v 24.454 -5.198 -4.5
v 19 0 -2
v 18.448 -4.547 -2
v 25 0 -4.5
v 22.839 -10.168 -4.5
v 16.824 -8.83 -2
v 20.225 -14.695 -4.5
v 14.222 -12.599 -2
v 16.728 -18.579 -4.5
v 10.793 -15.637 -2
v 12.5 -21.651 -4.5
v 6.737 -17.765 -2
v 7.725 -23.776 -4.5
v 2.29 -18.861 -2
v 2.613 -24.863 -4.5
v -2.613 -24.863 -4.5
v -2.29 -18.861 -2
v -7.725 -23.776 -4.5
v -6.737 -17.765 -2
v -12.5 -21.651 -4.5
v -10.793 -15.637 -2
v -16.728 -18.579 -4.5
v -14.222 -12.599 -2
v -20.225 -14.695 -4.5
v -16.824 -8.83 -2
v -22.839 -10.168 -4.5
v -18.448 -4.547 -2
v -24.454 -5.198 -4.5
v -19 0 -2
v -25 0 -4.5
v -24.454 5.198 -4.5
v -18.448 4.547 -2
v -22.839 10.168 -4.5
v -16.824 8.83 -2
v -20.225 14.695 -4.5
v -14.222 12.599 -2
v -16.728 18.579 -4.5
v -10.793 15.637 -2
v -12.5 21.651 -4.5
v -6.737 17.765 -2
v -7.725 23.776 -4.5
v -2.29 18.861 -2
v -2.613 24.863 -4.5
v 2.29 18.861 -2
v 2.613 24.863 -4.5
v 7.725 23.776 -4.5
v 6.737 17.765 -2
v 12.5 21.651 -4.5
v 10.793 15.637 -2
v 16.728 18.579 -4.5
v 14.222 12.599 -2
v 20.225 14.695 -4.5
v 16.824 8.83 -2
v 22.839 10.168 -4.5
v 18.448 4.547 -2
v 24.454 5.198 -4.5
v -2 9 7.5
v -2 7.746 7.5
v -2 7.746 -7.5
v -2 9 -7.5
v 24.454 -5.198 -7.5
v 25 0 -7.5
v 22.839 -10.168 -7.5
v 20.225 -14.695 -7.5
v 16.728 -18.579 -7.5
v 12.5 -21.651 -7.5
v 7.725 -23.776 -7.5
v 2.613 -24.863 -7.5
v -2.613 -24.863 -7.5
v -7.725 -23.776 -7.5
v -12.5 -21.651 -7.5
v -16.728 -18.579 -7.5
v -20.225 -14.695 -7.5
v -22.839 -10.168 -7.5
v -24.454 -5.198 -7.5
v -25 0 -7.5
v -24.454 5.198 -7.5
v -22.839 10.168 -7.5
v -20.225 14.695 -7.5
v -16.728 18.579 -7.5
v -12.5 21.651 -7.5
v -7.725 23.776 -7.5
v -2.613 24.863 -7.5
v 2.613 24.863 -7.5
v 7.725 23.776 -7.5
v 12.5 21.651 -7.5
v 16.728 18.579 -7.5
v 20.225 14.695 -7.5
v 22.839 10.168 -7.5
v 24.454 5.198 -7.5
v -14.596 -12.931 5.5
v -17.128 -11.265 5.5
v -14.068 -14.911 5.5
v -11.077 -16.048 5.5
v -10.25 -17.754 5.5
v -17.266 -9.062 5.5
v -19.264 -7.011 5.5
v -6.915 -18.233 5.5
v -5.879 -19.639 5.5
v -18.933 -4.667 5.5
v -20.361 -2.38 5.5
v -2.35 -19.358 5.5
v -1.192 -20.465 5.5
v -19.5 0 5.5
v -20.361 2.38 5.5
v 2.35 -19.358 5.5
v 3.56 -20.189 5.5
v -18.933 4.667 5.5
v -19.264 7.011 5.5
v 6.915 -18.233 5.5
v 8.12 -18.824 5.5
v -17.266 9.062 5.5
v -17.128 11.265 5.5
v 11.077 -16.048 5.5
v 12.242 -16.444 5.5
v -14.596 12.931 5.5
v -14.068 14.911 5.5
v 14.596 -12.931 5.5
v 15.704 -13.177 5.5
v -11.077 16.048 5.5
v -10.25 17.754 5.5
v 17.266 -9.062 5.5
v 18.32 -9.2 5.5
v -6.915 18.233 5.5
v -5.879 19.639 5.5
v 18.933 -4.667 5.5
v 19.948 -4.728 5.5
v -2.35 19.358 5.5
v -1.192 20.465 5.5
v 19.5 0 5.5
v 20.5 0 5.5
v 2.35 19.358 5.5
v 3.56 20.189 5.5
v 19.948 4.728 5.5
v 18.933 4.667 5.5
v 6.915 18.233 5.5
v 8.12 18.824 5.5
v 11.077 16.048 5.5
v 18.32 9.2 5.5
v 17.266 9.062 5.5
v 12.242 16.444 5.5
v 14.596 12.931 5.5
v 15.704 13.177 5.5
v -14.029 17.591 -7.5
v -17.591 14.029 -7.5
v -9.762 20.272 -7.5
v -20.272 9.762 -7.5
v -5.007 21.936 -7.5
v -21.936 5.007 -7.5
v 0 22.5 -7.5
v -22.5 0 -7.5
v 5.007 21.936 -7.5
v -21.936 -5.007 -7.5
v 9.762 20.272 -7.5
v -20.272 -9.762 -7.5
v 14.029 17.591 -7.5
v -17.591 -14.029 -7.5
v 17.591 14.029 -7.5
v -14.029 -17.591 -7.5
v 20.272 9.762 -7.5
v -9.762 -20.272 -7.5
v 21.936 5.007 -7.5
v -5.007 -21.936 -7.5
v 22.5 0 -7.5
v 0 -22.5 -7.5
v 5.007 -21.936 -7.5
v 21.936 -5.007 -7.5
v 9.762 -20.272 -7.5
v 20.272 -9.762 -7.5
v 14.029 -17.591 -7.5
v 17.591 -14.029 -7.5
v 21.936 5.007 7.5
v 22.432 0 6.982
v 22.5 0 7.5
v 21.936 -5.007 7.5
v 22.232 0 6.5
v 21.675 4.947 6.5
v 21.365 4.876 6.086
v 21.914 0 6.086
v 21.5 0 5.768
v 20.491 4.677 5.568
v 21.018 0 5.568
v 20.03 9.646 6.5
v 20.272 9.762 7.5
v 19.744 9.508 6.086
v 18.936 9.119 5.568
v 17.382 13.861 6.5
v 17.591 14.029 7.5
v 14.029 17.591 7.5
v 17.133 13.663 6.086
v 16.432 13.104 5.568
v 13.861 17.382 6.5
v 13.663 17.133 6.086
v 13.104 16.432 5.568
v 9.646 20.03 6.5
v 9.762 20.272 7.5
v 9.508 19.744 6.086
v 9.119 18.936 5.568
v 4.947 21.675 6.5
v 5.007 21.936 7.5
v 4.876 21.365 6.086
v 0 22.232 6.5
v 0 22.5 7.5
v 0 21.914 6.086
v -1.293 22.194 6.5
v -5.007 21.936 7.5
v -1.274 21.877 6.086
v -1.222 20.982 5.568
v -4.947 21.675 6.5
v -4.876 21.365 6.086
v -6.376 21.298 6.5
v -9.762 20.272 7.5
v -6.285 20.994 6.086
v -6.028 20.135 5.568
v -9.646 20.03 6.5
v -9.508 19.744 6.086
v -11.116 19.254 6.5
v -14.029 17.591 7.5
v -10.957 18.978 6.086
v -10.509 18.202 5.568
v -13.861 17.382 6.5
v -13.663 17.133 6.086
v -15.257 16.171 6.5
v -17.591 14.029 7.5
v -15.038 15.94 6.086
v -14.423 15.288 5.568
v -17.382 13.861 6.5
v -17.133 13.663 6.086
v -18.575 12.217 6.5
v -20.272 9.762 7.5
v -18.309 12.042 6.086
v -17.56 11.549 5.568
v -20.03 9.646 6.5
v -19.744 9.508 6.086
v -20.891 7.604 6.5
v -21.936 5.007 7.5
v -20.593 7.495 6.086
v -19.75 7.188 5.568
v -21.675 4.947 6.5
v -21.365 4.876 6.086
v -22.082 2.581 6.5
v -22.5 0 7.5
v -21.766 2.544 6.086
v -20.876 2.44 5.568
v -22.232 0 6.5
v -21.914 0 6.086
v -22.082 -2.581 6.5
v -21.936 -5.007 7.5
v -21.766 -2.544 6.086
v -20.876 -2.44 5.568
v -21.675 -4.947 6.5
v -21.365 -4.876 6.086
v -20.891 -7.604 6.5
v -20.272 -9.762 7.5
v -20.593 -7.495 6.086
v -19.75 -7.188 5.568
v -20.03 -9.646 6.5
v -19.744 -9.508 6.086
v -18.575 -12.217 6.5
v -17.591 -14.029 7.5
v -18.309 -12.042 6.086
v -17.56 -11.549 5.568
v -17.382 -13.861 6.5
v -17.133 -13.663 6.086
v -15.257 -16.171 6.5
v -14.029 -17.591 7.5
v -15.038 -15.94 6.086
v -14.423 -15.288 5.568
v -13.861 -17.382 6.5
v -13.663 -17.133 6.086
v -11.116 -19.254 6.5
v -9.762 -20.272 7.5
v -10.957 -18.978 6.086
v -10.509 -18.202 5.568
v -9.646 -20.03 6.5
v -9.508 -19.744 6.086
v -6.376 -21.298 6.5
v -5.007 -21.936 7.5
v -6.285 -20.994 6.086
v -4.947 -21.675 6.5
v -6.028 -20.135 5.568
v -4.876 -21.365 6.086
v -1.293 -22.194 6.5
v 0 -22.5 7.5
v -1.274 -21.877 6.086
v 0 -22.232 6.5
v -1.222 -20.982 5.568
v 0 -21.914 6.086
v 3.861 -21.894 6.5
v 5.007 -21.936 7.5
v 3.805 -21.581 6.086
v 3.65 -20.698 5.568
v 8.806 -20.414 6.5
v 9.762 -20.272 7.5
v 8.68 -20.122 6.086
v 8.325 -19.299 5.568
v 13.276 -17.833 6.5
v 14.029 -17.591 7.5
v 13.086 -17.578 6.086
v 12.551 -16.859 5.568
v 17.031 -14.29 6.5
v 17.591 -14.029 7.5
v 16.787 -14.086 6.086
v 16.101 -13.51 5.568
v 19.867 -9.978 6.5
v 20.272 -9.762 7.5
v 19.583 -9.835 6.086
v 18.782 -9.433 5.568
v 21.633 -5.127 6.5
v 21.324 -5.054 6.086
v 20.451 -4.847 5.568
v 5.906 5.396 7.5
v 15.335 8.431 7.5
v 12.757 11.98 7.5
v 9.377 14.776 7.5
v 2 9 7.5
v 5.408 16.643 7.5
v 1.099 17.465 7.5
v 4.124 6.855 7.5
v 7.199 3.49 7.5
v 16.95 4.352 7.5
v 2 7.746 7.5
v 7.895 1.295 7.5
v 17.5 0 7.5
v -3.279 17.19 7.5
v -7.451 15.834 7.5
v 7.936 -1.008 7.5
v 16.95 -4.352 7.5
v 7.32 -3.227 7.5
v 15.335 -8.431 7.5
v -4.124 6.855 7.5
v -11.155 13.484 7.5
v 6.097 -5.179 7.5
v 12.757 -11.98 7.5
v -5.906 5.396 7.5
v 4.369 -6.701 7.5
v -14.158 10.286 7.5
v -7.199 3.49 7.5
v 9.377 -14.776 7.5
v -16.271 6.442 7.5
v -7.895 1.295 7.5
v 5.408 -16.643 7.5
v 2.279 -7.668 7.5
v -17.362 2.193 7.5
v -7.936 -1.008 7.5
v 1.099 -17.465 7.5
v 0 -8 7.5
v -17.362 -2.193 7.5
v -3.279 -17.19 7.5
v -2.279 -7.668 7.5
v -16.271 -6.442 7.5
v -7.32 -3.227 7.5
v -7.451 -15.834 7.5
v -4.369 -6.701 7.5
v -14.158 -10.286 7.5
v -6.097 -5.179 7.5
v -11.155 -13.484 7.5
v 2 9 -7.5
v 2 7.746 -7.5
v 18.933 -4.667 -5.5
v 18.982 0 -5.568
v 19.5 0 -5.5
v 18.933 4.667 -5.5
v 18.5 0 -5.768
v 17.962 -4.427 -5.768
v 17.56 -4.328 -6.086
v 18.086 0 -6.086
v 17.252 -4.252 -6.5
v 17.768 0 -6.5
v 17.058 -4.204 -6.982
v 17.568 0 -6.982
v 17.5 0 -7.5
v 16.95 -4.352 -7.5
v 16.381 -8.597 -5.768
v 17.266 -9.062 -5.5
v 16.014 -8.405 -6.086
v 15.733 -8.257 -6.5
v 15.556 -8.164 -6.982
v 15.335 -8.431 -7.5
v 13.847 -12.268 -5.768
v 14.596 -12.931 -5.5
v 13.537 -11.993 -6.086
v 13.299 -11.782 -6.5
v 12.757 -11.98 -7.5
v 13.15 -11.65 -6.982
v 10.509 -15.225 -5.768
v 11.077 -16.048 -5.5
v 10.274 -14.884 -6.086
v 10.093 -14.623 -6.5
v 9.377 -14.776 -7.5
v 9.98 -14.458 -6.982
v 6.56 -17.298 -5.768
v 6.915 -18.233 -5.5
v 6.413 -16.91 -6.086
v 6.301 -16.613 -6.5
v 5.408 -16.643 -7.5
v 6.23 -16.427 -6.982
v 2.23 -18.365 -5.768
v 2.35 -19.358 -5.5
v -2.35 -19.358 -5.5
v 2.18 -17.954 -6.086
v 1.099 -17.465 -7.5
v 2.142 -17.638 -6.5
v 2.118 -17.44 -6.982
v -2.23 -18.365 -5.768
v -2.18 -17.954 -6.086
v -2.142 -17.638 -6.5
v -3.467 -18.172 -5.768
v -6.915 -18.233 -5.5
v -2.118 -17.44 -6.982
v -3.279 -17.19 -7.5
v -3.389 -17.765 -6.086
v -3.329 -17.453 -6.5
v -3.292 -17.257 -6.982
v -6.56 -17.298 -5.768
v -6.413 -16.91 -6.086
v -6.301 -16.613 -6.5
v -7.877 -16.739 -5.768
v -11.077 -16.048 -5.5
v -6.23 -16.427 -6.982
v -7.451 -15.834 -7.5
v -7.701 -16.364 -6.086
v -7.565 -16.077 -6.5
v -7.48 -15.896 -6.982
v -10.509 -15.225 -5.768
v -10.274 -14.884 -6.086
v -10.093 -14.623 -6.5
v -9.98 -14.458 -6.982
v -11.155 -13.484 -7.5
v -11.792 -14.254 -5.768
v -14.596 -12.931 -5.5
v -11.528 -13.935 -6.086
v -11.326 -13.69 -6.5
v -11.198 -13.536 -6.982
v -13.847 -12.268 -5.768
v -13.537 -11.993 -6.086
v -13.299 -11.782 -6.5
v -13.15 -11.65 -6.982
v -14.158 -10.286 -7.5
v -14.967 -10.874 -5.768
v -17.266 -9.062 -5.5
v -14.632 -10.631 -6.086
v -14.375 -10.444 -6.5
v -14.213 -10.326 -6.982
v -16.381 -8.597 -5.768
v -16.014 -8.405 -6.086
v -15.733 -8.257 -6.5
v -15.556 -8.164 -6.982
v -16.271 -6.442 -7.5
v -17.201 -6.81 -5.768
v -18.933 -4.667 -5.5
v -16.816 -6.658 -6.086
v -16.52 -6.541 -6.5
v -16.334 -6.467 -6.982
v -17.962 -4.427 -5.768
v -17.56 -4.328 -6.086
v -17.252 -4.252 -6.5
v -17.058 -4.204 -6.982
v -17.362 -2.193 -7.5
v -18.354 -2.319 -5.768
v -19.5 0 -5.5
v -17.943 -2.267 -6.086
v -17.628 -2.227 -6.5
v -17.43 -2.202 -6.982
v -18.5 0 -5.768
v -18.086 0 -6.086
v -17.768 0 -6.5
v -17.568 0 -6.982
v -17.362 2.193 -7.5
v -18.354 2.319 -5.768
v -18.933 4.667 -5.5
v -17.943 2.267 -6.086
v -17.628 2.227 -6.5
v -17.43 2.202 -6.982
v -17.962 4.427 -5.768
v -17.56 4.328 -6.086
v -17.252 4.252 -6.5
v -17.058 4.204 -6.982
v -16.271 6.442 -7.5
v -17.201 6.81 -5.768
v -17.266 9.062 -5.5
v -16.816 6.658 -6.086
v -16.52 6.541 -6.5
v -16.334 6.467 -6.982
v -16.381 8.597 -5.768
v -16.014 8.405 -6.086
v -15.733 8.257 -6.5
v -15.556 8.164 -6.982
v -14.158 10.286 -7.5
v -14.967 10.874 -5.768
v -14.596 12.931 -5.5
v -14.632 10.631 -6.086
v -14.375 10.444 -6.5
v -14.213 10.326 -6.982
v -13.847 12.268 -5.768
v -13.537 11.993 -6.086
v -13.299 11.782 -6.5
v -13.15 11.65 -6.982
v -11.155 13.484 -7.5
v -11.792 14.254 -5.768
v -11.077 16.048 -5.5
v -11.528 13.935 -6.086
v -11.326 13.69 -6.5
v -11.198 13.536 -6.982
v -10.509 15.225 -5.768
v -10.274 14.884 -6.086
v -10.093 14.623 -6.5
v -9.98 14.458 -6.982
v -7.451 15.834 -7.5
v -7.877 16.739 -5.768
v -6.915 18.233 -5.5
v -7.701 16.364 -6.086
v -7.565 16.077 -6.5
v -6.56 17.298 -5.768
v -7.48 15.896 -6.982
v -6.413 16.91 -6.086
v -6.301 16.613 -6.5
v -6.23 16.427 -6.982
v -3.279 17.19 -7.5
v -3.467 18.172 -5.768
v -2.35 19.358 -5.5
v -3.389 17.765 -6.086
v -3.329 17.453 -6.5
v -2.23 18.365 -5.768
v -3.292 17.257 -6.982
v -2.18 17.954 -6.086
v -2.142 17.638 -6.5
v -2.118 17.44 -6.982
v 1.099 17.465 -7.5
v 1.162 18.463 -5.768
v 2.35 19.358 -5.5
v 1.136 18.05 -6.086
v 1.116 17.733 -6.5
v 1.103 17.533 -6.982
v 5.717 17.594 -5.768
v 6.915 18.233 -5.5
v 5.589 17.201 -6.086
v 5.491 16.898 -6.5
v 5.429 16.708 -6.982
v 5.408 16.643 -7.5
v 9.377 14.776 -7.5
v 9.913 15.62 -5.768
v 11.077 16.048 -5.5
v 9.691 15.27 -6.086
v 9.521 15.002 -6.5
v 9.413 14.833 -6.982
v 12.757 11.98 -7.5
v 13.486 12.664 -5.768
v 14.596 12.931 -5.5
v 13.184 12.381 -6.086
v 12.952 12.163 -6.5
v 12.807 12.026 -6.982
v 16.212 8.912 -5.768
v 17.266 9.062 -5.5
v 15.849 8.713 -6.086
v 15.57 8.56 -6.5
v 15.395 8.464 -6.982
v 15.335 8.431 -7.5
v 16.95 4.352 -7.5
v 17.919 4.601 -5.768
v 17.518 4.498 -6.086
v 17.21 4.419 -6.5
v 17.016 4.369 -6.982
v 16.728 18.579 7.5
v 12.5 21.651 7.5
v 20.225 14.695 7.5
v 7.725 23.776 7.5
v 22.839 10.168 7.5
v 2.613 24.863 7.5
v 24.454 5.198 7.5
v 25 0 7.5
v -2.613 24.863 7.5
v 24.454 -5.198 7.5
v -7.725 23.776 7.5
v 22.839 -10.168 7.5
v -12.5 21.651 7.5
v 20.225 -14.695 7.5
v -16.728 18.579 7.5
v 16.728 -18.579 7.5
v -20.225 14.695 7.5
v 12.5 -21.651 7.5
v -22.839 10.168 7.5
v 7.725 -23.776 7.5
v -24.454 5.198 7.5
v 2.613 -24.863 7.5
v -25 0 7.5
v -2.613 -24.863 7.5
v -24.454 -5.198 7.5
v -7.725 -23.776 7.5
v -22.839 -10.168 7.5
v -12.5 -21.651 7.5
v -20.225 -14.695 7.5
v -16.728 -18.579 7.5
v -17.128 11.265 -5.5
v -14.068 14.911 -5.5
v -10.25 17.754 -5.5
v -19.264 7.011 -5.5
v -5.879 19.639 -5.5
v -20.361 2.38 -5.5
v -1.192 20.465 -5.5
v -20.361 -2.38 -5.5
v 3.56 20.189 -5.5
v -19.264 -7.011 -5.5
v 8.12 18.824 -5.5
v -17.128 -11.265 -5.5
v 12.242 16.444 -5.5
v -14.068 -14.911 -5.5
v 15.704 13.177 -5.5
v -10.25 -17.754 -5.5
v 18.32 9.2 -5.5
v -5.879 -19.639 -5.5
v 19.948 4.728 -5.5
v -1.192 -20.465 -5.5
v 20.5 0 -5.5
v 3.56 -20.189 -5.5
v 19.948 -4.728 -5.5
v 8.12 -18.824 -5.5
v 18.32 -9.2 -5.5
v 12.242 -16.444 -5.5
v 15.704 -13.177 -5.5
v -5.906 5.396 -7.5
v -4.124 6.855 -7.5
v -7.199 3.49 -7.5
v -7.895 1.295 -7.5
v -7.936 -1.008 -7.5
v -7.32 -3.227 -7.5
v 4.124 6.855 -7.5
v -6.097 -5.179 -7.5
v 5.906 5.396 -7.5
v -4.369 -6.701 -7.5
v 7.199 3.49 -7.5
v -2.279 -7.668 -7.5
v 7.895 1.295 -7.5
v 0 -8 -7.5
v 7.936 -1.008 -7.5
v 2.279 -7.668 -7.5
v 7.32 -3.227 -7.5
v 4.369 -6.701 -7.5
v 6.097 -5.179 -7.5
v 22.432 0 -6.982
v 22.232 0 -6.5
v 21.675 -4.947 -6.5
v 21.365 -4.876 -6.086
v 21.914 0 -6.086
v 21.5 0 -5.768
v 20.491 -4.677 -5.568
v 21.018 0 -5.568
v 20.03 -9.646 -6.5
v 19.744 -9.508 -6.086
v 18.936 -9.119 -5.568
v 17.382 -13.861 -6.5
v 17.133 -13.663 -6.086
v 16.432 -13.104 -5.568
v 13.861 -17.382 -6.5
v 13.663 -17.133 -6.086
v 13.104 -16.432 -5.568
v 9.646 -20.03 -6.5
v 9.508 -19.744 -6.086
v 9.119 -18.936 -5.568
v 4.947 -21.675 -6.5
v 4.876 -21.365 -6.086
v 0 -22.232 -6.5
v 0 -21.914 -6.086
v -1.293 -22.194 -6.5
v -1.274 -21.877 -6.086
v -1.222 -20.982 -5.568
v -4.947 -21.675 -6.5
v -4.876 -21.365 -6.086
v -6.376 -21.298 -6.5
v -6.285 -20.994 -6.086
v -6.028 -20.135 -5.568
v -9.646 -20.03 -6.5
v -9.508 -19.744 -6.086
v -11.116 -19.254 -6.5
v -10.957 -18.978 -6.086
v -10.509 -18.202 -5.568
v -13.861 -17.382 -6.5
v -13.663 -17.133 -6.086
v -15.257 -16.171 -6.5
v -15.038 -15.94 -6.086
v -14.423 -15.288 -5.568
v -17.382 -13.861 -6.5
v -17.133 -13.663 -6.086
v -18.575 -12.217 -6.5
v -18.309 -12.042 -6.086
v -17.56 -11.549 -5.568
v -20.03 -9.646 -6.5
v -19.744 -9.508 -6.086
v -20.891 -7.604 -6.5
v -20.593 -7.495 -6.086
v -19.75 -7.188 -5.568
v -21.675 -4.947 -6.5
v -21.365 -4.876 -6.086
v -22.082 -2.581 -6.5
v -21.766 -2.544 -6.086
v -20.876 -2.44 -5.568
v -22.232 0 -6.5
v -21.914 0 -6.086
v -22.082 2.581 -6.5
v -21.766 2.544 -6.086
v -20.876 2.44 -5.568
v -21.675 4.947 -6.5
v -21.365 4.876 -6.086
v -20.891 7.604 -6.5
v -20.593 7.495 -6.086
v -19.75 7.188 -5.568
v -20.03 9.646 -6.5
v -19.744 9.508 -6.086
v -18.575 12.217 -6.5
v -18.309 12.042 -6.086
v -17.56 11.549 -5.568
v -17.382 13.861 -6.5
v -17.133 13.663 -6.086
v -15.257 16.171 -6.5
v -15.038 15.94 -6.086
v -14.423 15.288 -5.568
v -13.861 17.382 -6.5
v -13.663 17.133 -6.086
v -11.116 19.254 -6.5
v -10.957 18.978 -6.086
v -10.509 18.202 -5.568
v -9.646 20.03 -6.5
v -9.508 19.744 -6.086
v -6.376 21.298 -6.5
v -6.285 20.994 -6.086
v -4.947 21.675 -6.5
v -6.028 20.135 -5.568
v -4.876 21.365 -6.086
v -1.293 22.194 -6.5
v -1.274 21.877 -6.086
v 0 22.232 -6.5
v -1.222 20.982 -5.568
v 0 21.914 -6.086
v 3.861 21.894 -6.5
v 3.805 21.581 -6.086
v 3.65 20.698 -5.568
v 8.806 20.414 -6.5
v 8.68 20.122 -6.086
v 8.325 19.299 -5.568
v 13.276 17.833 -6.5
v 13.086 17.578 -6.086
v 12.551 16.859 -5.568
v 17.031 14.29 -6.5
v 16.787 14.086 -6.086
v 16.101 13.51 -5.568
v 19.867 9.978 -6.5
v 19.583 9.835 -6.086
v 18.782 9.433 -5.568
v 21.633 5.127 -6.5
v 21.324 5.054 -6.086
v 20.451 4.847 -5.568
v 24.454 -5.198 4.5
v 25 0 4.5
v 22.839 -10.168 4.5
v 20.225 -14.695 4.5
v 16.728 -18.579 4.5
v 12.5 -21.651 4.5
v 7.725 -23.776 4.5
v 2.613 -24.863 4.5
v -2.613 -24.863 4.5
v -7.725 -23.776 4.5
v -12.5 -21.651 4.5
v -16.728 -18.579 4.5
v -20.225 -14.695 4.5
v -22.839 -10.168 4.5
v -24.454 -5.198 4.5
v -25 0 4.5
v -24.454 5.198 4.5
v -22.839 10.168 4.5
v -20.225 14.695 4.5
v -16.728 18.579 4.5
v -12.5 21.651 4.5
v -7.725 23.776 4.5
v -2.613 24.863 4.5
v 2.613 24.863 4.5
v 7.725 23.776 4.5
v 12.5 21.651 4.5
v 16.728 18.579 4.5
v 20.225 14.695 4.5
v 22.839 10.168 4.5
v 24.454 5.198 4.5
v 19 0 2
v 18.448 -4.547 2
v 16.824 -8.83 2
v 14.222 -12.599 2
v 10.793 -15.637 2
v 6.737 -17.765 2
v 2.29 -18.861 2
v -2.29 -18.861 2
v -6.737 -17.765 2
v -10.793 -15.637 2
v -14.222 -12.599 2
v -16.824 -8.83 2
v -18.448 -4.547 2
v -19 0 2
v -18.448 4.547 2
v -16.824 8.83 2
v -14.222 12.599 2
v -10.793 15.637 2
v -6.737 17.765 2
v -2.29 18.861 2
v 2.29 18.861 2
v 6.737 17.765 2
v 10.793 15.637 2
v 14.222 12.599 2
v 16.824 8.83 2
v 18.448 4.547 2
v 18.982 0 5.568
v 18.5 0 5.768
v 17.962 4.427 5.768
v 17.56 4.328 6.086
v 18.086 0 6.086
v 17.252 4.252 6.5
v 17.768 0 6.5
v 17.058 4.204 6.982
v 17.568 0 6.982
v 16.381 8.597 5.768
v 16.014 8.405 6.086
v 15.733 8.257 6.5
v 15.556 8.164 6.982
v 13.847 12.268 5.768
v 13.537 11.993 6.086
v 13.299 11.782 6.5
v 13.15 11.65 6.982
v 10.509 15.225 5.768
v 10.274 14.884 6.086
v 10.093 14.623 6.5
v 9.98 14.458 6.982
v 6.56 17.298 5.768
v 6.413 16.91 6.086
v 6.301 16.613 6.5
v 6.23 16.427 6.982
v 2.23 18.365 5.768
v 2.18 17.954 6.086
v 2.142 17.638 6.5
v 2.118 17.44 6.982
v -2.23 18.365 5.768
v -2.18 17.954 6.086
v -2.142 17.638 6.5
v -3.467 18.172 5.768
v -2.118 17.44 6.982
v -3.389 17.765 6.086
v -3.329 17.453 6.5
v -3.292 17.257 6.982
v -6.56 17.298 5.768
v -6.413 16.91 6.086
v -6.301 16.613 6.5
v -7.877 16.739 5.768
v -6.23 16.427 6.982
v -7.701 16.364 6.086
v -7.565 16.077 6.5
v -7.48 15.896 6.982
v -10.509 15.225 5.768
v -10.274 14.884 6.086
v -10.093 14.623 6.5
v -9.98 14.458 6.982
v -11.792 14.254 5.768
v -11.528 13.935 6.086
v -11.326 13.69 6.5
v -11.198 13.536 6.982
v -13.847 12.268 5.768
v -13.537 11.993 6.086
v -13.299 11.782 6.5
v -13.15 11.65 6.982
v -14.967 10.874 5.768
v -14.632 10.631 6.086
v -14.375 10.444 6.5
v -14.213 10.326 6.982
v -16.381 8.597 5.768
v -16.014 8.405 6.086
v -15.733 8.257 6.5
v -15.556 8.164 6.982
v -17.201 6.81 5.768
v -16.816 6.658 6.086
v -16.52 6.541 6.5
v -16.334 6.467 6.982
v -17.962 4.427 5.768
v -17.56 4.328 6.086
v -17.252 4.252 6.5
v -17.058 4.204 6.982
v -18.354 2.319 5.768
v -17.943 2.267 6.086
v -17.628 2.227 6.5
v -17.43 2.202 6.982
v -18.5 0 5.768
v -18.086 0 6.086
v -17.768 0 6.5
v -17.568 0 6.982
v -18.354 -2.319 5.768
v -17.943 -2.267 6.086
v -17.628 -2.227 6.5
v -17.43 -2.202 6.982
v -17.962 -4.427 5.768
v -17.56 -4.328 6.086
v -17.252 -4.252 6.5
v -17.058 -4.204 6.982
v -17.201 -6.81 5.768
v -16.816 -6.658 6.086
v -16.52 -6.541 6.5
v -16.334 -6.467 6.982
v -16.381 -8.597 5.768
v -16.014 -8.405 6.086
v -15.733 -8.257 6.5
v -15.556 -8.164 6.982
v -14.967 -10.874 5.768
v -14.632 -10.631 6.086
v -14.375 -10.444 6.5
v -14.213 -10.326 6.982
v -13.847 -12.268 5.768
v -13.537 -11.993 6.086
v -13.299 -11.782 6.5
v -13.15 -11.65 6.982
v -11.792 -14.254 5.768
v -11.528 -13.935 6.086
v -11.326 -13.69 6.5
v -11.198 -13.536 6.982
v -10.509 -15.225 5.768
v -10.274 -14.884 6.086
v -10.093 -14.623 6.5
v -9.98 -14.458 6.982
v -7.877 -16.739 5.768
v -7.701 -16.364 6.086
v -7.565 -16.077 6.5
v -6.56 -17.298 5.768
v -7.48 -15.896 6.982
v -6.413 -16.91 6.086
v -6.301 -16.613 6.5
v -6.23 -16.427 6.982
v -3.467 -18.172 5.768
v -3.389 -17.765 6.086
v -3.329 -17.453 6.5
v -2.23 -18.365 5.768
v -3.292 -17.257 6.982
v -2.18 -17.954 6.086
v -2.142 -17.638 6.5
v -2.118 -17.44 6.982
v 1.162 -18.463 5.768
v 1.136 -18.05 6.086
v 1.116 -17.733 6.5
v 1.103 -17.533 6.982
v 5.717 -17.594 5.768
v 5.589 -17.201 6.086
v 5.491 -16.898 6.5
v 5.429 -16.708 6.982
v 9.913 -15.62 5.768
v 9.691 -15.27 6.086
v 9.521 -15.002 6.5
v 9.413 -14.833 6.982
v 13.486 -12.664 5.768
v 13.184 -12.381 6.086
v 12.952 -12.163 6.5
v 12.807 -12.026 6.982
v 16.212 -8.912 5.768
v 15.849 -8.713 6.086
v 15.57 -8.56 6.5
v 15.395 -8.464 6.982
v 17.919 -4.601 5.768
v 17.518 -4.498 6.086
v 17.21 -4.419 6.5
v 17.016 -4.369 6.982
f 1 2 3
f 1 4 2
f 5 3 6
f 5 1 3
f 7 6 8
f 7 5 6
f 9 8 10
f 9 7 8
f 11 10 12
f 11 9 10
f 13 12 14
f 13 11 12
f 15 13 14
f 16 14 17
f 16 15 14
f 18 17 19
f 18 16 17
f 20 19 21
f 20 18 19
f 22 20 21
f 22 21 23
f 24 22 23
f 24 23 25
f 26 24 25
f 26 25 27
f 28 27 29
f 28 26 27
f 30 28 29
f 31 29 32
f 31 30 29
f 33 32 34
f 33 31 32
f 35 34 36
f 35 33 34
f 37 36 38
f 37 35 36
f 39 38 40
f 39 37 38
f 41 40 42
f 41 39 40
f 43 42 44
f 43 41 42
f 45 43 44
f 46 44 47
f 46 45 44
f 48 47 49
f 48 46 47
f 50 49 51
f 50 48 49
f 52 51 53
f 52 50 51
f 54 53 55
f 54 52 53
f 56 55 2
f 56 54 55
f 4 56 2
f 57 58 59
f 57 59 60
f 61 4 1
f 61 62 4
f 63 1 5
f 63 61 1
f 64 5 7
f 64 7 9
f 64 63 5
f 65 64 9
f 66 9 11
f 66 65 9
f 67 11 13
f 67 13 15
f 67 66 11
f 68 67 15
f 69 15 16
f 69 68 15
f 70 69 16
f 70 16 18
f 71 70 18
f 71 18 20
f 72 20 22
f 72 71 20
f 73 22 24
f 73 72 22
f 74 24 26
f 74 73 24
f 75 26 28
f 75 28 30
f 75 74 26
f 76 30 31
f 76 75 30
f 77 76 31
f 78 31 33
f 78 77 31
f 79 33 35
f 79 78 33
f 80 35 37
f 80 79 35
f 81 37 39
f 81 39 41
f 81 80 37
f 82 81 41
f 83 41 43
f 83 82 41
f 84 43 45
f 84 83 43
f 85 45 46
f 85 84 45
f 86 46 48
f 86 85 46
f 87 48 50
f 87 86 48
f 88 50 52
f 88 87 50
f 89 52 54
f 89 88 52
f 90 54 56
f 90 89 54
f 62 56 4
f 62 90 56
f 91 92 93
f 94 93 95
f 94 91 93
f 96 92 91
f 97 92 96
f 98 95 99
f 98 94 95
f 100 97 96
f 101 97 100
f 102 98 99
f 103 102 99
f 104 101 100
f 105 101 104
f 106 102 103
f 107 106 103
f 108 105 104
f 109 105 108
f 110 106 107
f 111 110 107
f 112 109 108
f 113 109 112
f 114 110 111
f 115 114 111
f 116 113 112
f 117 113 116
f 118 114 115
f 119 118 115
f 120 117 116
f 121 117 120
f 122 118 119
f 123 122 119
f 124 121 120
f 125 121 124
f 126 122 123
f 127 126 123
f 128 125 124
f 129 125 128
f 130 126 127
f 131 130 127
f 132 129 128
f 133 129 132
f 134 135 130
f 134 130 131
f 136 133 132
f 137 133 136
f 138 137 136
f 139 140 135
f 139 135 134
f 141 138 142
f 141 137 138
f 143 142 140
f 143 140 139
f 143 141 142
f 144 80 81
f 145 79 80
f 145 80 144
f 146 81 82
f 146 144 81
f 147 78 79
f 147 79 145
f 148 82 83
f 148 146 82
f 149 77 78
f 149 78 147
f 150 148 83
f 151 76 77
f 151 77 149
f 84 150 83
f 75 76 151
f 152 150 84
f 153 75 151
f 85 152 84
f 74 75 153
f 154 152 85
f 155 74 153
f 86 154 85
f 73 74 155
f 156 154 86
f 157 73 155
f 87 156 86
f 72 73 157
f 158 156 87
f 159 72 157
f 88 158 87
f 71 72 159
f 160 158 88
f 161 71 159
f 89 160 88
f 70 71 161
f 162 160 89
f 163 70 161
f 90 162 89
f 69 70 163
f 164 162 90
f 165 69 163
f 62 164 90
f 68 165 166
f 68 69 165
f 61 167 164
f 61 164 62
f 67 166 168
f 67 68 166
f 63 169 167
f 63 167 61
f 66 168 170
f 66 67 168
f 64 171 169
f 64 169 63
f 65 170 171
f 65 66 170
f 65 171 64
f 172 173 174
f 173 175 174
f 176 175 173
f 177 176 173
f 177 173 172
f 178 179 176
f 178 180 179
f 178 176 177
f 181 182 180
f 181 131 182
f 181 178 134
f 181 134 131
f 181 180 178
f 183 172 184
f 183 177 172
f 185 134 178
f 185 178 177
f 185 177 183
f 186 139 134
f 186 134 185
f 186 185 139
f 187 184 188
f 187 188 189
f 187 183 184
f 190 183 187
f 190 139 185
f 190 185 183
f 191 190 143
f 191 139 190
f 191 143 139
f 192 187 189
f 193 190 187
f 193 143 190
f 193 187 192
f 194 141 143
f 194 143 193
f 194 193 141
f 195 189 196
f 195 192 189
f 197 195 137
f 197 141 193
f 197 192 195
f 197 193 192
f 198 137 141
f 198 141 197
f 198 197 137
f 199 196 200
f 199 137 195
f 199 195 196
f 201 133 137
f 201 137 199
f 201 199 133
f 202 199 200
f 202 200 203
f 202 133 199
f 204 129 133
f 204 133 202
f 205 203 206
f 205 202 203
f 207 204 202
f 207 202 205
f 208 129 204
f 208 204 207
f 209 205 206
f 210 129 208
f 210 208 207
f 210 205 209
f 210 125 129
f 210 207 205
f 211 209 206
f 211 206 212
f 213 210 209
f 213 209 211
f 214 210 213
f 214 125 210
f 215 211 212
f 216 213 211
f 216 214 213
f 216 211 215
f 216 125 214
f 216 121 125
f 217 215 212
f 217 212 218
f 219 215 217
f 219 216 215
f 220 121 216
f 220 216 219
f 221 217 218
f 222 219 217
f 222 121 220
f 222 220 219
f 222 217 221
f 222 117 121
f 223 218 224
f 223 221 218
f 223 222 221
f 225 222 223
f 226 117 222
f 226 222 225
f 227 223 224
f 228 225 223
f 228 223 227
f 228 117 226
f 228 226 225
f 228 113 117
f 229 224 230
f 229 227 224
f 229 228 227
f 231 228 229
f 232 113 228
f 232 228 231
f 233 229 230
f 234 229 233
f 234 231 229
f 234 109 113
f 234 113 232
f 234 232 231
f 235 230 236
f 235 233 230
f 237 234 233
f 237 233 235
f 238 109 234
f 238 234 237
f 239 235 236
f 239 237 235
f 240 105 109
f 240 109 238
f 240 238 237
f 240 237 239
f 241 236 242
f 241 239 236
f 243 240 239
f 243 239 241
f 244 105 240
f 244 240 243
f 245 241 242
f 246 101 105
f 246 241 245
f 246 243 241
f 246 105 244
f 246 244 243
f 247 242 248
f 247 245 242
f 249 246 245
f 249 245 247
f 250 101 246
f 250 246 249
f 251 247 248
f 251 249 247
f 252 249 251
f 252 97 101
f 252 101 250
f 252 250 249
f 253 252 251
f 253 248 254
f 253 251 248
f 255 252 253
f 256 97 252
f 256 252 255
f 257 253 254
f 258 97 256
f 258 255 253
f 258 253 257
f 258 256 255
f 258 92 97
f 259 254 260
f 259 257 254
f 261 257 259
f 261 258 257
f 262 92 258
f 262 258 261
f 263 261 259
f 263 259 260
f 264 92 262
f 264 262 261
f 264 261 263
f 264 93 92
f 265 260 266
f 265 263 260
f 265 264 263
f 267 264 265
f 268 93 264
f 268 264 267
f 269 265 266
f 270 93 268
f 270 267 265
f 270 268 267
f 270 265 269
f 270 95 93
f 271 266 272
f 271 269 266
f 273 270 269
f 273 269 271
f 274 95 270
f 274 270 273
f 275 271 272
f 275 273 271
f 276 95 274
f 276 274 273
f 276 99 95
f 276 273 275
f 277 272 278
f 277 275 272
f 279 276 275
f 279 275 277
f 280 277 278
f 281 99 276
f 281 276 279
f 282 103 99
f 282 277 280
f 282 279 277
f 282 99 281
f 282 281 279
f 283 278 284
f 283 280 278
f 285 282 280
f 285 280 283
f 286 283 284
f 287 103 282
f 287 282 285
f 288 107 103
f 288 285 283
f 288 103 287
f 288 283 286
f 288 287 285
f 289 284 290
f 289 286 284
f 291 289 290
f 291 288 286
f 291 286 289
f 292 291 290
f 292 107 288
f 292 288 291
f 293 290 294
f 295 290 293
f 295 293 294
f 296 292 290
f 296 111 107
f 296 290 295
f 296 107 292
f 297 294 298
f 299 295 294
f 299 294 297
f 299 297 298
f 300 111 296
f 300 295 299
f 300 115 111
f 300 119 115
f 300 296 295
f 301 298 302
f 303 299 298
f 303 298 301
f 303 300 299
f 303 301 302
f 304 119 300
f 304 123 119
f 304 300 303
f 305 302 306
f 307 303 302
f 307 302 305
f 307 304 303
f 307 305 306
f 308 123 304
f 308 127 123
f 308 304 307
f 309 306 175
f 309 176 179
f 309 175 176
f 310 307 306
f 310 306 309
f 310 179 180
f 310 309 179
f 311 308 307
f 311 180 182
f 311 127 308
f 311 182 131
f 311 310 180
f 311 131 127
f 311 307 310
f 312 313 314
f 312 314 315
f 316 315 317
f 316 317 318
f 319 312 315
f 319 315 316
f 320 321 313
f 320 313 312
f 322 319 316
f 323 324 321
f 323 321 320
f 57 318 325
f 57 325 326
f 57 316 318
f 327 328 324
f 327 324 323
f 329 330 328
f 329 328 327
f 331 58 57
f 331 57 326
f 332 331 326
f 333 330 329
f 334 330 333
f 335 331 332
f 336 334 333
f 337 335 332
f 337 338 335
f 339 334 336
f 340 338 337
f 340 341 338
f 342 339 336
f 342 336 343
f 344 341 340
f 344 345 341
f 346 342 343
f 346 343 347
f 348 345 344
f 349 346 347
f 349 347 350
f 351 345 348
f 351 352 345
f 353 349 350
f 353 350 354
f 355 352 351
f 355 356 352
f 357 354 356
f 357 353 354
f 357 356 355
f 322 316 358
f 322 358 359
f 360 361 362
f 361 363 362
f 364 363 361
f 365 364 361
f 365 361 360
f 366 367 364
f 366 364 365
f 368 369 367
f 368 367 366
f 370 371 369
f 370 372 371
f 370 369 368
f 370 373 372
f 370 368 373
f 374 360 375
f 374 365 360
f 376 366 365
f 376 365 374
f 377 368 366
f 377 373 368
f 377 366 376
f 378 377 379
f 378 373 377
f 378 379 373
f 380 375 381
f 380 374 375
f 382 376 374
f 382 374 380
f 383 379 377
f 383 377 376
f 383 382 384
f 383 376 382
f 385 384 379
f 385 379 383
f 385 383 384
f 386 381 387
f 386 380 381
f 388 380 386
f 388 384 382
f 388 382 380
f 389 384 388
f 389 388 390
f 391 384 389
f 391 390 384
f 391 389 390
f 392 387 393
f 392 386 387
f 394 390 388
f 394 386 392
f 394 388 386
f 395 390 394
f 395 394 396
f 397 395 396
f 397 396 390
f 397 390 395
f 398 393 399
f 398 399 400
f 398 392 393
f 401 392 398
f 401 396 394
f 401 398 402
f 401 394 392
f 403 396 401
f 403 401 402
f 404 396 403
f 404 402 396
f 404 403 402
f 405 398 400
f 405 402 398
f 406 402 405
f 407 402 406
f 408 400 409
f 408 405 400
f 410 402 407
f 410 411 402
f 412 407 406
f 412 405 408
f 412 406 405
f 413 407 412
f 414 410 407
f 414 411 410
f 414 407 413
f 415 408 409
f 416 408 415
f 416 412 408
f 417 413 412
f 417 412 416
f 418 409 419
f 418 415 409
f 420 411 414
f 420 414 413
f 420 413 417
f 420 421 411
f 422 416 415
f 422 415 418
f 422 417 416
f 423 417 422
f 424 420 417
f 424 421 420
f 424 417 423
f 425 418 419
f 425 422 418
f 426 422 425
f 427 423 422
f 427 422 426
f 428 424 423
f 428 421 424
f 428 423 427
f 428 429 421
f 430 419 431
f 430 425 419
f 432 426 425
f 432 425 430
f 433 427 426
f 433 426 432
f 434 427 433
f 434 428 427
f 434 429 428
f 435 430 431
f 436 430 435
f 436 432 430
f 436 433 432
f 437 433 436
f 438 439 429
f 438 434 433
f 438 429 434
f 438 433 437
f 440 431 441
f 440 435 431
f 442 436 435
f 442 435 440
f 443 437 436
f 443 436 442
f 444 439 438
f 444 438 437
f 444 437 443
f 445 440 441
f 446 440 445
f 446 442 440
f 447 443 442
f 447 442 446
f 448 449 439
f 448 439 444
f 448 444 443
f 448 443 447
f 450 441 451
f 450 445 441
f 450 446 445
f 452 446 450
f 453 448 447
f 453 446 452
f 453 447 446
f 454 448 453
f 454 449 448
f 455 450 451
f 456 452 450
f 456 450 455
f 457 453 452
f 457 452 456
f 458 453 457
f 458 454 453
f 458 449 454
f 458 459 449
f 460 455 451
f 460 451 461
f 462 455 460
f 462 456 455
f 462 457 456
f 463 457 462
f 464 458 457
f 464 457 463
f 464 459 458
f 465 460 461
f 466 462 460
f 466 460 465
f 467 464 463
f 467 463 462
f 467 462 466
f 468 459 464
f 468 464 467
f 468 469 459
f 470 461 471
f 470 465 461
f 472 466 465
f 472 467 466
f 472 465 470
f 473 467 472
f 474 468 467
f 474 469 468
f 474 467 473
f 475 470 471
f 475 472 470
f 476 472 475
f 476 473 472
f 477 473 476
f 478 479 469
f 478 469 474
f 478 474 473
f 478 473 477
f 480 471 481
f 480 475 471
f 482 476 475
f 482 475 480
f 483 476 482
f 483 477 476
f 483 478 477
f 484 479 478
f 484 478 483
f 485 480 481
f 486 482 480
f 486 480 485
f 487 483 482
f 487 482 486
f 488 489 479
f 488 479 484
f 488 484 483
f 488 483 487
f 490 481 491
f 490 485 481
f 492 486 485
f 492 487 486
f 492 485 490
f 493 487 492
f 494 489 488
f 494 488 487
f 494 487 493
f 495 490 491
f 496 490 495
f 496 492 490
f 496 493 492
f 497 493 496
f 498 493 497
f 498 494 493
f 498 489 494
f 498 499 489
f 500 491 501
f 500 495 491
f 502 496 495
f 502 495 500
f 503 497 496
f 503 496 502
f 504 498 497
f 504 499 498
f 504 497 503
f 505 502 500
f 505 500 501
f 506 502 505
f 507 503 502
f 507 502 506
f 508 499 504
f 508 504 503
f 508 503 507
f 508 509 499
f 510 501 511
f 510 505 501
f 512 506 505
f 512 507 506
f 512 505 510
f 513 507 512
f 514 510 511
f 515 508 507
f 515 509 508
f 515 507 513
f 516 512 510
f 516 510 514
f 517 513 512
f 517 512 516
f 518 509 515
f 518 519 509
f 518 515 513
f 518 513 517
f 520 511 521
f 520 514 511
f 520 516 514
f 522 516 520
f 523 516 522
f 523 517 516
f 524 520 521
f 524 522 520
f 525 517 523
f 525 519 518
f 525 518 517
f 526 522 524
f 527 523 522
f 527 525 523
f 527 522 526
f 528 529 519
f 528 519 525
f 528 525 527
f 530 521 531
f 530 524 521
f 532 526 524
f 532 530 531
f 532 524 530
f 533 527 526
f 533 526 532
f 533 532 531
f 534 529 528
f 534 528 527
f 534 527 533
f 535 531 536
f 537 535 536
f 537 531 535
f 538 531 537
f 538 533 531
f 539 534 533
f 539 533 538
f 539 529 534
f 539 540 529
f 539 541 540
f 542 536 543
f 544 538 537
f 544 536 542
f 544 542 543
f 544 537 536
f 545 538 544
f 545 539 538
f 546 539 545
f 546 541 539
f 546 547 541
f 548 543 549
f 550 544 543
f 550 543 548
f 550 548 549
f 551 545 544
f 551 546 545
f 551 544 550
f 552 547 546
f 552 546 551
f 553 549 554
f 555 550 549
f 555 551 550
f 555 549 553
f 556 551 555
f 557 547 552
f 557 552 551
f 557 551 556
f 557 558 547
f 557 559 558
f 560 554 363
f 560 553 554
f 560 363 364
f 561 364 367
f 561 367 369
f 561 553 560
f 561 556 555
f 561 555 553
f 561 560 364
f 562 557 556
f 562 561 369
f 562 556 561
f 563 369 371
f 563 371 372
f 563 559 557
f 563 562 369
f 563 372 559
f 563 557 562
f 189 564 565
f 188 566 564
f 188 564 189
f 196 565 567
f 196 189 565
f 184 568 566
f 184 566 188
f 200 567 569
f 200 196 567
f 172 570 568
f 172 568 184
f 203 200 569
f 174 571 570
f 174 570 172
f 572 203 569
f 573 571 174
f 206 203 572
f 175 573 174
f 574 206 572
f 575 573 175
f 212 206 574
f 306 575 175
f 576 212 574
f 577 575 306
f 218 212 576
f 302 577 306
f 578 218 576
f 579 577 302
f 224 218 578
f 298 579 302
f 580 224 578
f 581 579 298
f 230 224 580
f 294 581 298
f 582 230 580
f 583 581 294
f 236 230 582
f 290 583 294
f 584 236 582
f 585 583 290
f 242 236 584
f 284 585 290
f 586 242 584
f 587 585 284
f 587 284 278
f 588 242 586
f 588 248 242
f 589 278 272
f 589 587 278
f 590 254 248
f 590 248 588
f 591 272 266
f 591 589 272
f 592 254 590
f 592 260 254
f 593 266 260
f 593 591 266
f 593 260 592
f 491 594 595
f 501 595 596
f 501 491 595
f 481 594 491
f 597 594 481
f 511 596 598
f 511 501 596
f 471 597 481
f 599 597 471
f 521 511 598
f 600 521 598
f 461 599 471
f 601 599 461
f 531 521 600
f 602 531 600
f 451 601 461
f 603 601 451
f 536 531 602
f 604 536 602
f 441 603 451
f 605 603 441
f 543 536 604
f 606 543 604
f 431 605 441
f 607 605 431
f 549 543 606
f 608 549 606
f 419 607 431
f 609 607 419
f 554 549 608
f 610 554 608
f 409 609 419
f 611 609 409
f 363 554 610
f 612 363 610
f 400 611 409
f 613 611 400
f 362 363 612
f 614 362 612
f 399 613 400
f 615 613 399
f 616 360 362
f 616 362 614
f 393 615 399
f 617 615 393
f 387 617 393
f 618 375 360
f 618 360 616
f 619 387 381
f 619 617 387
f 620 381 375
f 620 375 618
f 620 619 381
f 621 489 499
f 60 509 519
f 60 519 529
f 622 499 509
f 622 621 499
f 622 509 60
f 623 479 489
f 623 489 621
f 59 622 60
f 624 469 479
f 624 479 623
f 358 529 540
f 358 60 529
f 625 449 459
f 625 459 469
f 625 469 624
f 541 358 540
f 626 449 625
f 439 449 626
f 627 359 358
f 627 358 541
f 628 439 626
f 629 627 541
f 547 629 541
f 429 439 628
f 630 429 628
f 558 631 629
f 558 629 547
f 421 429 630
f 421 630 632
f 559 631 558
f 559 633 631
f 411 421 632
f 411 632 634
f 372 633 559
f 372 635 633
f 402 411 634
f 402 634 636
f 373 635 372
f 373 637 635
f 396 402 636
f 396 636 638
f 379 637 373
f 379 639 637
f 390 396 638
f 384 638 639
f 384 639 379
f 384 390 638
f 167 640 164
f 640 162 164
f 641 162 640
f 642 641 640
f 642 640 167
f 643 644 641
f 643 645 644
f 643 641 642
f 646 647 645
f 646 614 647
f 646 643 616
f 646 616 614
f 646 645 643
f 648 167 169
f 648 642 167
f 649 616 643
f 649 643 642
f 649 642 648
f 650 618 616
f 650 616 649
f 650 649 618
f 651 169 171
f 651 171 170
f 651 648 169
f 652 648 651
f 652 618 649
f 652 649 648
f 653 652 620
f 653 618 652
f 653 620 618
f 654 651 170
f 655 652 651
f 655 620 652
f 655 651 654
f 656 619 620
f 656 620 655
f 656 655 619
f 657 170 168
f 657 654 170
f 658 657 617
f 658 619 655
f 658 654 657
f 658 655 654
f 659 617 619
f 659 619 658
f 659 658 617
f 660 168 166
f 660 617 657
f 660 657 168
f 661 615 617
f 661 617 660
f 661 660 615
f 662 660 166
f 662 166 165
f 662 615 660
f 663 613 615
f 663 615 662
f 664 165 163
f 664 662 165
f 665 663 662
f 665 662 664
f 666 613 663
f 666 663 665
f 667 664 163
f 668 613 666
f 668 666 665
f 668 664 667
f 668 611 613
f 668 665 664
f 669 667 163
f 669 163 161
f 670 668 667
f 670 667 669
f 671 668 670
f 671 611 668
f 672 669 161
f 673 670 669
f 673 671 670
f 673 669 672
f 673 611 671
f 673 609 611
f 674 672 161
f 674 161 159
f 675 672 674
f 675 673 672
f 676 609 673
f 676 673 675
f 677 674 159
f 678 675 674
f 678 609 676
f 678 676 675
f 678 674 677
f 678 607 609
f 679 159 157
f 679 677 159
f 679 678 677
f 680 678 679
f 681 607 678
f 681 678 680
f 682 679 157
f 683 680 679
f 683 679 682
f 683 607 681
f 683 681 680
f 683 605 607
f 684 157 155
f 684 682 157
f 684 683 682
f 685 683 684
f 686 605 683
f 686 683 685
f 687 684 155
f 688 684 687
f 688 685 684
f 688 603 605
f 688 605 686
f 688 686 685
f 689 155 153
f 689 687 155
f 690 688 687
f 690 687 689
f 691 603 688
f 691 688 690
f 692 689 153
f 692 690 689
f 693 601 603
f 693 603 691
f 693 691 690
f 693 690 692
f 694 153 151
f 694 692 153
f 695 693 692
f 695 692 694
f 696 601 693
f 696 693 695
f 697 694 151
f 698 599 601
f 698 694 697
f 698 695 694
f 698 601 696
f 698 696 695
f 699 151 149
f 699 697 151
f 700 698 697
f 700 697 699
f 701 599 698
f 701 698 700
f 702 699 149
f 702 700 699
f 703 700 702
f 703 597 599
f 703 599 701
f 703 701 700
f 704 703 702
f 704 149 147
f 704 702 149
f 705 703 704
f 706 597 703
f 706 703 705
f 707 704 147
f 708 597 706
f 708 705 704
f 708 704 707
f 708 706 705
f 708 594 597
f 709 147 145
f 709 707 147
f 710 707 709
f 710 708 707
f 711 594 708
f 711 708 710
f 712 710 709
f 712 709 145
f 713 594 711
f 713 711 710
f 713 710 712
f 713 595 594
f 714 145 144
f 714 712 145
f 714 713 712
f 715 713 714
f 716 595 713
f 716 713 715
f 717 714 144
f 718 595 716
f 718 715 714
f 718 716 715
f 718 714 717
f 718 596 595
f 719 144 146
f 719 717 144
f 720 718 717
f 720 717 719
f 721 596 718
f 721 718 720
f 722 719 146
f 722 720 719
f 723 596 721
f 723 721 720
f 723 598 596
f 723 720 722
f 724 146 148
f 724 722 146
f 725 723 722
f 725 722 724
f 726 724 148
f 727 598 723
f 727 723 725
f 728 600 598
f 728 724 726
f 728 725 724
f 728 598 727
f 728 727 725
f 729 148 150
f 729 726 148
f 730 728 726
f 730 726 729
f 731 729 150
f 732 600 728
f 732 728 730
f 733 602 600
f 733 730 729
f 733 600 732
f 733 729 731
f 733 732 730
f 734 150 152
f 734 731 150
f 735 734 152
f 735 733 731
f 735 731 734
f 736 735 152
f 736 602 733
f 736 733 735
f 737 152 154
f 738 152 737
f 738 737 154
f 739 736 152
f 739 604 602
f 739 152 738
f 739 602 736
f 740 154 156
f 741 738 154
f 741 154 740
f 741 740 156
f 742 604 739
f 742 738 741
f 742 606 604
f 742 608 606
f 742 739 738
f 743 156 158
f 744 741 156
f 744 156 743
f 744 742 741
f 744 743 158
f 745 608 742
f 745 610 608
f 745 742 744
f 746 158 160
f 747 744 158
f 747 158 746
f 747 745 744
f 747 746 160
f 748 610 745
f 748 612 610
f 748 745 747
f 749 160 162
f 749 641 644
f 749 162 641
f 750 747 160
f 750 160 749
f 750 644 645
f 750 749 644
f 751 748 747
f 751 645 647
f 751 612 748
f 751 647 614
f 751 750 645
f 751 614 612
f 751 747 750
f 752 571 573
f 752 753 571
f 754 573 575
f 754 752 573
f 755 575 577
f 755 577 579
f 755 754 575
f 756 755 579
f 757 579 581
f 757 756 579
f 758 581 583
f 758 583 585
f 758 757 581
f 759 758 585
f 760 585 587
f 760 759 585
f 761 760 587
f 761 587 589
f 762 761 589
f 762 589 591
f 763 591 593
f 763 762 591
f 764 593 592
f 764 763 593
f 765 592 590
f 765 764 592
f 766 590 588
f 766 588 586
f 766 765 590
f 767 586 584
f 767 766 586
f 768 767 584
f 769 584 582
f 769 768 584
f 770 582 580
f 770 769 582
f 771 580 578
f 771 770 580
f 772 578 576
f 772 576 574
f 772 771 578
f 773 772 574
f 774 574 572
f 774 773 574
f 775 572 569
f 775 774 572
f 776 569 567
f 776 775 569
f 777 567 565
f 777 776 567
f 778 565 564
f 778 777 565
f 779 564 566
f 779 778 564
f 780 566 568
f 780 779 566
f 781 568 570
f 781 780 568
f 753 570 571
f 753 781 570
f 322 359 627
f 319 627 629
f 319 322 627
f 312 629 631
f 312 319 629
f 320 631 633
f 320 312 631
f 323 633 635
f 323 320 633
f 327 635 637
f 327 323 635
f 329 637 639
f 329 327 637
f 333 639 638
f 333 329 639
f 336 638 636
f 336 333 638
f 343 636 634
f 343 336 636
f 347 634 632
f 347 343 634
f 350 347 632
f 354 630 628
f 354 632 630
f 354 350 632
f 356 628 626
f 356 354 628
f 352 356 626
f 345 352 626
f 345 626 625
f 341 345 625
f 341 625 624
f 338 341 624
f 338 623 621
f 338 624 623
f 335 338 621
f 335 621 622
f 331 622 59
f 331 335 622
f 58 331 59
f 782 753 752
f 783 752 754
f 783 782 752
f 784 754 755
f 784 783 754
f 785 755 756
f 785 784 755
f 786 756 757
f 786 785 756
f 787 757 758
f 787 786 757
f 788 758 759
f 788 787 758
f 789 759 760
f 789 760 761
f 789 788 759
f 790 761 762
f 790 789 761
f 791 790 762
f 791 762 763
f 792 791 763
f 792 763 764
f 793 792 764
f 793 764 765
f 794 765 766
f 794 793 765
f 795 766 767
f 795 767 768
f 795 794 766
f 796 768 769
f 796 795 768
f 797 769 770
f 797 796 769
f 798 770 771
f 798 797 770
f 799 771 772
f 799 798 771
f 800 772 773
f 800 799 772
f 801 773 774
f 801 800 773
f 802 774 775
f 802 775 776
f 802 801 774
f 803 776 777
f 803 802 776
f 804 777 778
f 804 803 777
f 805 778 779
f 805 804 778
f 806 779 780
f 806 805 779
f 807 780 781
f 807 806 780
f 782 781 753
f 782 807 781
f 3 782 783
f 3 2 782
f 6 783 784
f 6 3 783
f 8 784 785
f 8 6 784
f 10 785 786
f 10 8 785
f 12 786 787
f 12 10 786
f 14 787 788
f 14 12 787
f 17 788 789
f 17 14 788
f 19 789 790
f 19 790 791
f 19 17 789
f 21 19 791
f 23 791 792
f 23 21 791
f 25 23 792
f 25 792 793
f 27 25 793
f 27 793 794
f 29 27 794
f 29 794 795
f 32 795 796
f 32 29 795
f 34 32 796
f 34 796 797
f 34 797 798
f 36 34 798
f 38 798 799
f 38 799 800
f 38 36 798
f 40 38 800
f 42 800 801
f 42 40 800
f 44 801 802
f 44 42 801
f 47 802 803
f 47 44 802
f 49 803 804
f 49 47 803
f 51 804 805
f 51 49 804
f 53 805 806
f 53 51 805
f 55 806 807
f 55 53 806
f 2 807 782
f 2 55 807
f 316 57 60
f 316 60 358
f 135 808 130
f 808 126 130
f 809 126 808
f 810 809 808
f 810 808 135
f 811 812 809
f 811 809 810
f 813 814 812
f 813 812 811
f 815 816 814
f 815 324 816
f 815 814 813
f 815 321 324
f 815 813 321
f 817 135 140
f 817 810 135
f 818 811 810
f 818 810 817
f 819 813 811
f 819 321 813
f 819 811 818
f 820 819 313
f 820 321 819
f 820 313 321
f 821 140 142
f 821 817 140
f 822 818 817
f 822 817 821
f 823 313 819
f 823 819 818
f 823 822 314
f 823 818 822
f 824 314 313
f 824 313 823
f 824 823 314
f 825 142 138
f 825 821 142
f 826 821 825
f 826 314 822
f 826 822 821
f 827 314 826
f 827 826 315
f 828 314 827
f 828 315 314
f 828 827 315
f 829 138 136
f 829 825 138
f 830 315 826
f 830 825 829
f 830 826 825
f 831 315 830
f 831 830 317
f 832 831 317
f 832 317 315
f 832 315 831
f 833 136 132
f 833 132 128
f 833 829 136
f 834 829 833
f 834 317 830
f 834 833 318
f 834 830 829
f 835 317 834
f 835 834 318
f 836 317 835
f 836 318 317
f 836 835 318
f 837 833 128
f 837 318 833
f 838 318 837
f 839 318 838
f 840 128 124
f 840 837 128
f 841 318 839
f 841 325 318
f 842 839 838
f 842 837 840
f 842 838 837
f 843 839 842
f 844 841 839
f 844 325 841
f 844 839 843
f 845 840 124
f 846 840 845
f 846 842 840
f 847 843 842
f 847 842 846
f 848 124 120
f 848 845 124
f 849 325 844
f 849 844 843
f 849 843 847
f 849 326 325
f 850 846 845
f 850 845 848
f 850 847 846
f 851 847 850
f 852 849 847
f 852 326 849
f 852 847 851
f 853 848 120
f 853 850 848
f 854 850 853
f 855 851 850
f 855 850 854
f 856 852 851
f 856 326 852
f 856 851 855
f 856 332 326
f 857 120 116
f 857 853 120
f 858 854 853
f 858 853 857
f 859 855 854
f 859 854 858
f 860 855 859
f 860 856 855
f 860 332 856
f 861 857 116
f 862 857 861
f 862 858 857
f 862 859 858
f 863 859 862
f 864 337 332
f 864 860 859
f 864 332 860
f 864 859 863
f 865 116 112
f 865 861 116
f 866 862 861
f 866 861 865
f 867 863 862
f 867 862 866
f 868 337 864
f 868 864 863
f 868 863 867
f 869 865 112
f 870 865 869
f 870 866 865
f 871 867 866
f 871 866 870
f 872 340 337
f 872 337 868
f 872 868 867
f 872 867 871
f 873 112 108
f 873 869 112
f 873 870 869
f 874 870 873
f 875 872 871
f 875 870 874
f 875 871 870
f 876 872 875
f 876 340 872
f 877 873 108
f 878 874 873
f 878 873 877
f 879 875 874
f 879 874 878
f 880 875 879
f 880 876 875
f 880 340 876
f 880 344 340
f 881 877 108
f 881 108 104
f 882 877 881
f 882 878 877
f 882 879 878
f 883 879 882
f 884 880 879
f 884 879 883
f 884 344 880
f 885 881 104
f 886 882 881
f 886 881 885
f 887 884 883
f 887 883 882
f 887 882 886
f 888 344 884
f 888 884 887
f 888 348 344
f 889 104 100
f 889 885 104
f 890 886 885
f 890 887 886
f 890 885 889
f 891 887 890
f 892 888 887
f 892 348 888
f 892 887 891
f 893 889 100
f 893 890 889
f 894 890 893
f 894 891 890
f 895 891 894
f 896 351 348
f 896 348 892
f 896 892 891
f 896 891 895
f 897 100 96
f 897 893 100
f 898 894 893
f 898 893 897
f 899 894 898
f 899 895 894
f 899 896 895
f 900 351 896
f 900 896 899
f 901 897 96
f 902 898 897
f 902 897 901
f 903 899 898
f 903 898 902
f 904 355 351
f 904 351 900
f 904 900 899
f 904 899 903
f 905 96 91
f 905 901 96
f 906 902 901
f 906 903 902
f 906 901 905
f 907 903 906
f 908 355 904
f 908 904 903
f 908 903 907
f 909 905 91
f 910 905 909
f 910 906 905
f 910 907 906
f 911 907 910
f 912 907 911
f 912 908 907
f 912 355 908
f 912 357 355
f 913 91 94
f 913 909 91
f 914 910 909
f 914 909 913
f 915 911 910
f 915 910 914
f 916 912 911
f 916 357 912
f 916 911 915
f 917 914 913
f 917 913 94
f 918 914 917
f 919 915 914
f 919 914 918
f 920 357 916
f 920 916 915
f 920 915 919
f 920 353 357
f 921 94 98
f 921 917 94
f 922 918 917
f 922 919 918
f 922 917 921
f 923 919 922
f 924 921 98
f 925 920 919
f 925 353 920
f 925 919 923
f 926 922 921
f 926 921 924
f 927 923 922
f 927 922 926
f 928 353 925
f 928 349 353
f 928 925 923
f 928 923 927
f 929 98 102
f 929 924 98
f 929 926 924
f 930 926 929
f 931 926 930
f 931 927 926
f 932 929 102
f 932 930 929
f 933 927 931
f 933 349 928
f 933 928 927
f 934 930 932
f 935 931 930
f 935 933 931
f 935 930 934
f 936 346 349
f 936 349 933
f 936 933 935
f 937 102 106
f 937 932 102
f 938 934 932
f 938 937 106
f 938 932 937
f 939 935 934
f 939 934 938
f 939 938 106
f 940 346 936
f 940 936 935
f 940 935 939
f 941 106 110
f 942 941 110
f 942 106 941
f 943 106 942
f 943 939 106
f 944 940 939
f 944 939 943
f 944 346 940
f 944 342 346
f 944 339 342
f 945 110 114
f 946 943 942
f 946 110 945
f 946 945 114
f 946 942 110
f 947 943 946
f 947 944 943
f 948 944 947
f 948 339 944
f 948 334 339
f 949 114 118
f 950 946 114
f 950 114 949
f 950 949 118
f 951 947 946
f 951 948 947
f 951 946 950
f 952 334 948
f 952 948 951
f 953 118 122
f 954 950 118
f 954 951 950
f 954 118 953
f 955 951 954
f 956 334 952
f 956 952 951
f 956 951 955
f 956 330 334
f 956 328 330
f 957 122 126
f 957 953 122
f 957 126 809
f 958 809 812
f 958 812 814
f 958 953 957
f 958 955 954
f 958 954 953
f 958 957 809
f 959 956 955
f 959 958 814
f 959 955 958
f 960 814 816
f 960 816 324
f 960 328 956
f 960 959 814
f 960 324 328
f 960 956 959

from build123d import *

# Parameters (mm, degrees)
CUT_EXTRUDE1_DEPTH = 39.405728739
SKETCH3_R          = 22.5
SKETCH3_R_2        = 17.5
CUT_EXTRUDE2_DEPTH = 2
CUT_EXTRUDE3_START = -2
SKETCH4_R          = 22.5
SKETCH4_R_2        = 17.5
CUT_EXTRUDE3_DEPTH = 2
FILLET1_R          = 2


with BuildPart() as part:
    # Sketch1 → Revolve1 (revolve)
    with BuildSketch(Plane(origin=(0, 0, 0), x_dir=(0, 0, -1), z_dir=(1, 0, 0)), mode=Mode.PRIVATE) as revolve1_sk:
        Polygon((4.5, 25), (7.5, 25), (7.5, 0), (0, 0), (-7.5, 0), (-7.5, 25), (-4.5, 25), (-2, 19), (2, 19), align=None)
    revolve(revolve1_sk.sketch.rotate(Axis((0, 0, 350.137387165), (0, 0, -1)), 90), axis=Axis((0, 0, 350.137387165), (0, 0, -1)))

    # Sketch2 → Cut-Extrude1 (cut, through all)
    with BuildSketch(Plane.XY.offset(7.5)):
        with BuildLine():
            Line((-2, 9), (2, 9))
            Line((2, 9), (2, 7.745966692))
            ThreePointArc((2, 7.745966692), (0, -8), (-2, 7.745966692))
            Line((-2, 7.745966692), (-2, 9))
        make_face()
    extrude(amount=-CUT_EXTRUDE1_DEPTH, mode=Mode.SUBTRACT)

    # Sketch3 → Cut-Extrude2 (cut)
    with BuildSketch(Plane.XY.offset(7.5)):
        Circle(SKETCH3_R)
        Circle(SKETCH3_R_2, mode=Mode.SUBTRACT)
    extrude(amount=-CUT_EXTRUDE2_DEPTH, mode=Mode.SUBTRACT)

    # Sketch4 → Cut-Extrude3 (cut)
    with BuildSketch(Plane(origin=(0, 0, -7.5), x_dir=(-1, 0, 0), z_dir=(0, 0, -1)).offset(CUT_EXTRUDE3_START)):
        with Locations(Location((0, 0, 0), (0, 0, 180))):
            Circle(SKETCH4_R)
        with Locations(Location((0, 0, 0), (0, 0, 180))):
            Circle(SKETCH4_R_2, mode=Mode.SUBTRACT)
    extrude(amount=CUT_EXTRUDE3_DEPTH, mode=Mode.SUBTRACT)

    # Fillet1
    fillet1_edges = [part.edges().sort_by_distance(p)[0] for p in [
        (-22.5, 0, 5.5),
        (-17.5, 0, 5.5),
        (-22.5, 0, -5.5),
        (-17.5, 0, -5.5),
    ]]
    fillet(fillet1_edges, radius=FILLET1_R - 0.0001)  # a hair under: the kernel refuses the full size


solid = part.part
